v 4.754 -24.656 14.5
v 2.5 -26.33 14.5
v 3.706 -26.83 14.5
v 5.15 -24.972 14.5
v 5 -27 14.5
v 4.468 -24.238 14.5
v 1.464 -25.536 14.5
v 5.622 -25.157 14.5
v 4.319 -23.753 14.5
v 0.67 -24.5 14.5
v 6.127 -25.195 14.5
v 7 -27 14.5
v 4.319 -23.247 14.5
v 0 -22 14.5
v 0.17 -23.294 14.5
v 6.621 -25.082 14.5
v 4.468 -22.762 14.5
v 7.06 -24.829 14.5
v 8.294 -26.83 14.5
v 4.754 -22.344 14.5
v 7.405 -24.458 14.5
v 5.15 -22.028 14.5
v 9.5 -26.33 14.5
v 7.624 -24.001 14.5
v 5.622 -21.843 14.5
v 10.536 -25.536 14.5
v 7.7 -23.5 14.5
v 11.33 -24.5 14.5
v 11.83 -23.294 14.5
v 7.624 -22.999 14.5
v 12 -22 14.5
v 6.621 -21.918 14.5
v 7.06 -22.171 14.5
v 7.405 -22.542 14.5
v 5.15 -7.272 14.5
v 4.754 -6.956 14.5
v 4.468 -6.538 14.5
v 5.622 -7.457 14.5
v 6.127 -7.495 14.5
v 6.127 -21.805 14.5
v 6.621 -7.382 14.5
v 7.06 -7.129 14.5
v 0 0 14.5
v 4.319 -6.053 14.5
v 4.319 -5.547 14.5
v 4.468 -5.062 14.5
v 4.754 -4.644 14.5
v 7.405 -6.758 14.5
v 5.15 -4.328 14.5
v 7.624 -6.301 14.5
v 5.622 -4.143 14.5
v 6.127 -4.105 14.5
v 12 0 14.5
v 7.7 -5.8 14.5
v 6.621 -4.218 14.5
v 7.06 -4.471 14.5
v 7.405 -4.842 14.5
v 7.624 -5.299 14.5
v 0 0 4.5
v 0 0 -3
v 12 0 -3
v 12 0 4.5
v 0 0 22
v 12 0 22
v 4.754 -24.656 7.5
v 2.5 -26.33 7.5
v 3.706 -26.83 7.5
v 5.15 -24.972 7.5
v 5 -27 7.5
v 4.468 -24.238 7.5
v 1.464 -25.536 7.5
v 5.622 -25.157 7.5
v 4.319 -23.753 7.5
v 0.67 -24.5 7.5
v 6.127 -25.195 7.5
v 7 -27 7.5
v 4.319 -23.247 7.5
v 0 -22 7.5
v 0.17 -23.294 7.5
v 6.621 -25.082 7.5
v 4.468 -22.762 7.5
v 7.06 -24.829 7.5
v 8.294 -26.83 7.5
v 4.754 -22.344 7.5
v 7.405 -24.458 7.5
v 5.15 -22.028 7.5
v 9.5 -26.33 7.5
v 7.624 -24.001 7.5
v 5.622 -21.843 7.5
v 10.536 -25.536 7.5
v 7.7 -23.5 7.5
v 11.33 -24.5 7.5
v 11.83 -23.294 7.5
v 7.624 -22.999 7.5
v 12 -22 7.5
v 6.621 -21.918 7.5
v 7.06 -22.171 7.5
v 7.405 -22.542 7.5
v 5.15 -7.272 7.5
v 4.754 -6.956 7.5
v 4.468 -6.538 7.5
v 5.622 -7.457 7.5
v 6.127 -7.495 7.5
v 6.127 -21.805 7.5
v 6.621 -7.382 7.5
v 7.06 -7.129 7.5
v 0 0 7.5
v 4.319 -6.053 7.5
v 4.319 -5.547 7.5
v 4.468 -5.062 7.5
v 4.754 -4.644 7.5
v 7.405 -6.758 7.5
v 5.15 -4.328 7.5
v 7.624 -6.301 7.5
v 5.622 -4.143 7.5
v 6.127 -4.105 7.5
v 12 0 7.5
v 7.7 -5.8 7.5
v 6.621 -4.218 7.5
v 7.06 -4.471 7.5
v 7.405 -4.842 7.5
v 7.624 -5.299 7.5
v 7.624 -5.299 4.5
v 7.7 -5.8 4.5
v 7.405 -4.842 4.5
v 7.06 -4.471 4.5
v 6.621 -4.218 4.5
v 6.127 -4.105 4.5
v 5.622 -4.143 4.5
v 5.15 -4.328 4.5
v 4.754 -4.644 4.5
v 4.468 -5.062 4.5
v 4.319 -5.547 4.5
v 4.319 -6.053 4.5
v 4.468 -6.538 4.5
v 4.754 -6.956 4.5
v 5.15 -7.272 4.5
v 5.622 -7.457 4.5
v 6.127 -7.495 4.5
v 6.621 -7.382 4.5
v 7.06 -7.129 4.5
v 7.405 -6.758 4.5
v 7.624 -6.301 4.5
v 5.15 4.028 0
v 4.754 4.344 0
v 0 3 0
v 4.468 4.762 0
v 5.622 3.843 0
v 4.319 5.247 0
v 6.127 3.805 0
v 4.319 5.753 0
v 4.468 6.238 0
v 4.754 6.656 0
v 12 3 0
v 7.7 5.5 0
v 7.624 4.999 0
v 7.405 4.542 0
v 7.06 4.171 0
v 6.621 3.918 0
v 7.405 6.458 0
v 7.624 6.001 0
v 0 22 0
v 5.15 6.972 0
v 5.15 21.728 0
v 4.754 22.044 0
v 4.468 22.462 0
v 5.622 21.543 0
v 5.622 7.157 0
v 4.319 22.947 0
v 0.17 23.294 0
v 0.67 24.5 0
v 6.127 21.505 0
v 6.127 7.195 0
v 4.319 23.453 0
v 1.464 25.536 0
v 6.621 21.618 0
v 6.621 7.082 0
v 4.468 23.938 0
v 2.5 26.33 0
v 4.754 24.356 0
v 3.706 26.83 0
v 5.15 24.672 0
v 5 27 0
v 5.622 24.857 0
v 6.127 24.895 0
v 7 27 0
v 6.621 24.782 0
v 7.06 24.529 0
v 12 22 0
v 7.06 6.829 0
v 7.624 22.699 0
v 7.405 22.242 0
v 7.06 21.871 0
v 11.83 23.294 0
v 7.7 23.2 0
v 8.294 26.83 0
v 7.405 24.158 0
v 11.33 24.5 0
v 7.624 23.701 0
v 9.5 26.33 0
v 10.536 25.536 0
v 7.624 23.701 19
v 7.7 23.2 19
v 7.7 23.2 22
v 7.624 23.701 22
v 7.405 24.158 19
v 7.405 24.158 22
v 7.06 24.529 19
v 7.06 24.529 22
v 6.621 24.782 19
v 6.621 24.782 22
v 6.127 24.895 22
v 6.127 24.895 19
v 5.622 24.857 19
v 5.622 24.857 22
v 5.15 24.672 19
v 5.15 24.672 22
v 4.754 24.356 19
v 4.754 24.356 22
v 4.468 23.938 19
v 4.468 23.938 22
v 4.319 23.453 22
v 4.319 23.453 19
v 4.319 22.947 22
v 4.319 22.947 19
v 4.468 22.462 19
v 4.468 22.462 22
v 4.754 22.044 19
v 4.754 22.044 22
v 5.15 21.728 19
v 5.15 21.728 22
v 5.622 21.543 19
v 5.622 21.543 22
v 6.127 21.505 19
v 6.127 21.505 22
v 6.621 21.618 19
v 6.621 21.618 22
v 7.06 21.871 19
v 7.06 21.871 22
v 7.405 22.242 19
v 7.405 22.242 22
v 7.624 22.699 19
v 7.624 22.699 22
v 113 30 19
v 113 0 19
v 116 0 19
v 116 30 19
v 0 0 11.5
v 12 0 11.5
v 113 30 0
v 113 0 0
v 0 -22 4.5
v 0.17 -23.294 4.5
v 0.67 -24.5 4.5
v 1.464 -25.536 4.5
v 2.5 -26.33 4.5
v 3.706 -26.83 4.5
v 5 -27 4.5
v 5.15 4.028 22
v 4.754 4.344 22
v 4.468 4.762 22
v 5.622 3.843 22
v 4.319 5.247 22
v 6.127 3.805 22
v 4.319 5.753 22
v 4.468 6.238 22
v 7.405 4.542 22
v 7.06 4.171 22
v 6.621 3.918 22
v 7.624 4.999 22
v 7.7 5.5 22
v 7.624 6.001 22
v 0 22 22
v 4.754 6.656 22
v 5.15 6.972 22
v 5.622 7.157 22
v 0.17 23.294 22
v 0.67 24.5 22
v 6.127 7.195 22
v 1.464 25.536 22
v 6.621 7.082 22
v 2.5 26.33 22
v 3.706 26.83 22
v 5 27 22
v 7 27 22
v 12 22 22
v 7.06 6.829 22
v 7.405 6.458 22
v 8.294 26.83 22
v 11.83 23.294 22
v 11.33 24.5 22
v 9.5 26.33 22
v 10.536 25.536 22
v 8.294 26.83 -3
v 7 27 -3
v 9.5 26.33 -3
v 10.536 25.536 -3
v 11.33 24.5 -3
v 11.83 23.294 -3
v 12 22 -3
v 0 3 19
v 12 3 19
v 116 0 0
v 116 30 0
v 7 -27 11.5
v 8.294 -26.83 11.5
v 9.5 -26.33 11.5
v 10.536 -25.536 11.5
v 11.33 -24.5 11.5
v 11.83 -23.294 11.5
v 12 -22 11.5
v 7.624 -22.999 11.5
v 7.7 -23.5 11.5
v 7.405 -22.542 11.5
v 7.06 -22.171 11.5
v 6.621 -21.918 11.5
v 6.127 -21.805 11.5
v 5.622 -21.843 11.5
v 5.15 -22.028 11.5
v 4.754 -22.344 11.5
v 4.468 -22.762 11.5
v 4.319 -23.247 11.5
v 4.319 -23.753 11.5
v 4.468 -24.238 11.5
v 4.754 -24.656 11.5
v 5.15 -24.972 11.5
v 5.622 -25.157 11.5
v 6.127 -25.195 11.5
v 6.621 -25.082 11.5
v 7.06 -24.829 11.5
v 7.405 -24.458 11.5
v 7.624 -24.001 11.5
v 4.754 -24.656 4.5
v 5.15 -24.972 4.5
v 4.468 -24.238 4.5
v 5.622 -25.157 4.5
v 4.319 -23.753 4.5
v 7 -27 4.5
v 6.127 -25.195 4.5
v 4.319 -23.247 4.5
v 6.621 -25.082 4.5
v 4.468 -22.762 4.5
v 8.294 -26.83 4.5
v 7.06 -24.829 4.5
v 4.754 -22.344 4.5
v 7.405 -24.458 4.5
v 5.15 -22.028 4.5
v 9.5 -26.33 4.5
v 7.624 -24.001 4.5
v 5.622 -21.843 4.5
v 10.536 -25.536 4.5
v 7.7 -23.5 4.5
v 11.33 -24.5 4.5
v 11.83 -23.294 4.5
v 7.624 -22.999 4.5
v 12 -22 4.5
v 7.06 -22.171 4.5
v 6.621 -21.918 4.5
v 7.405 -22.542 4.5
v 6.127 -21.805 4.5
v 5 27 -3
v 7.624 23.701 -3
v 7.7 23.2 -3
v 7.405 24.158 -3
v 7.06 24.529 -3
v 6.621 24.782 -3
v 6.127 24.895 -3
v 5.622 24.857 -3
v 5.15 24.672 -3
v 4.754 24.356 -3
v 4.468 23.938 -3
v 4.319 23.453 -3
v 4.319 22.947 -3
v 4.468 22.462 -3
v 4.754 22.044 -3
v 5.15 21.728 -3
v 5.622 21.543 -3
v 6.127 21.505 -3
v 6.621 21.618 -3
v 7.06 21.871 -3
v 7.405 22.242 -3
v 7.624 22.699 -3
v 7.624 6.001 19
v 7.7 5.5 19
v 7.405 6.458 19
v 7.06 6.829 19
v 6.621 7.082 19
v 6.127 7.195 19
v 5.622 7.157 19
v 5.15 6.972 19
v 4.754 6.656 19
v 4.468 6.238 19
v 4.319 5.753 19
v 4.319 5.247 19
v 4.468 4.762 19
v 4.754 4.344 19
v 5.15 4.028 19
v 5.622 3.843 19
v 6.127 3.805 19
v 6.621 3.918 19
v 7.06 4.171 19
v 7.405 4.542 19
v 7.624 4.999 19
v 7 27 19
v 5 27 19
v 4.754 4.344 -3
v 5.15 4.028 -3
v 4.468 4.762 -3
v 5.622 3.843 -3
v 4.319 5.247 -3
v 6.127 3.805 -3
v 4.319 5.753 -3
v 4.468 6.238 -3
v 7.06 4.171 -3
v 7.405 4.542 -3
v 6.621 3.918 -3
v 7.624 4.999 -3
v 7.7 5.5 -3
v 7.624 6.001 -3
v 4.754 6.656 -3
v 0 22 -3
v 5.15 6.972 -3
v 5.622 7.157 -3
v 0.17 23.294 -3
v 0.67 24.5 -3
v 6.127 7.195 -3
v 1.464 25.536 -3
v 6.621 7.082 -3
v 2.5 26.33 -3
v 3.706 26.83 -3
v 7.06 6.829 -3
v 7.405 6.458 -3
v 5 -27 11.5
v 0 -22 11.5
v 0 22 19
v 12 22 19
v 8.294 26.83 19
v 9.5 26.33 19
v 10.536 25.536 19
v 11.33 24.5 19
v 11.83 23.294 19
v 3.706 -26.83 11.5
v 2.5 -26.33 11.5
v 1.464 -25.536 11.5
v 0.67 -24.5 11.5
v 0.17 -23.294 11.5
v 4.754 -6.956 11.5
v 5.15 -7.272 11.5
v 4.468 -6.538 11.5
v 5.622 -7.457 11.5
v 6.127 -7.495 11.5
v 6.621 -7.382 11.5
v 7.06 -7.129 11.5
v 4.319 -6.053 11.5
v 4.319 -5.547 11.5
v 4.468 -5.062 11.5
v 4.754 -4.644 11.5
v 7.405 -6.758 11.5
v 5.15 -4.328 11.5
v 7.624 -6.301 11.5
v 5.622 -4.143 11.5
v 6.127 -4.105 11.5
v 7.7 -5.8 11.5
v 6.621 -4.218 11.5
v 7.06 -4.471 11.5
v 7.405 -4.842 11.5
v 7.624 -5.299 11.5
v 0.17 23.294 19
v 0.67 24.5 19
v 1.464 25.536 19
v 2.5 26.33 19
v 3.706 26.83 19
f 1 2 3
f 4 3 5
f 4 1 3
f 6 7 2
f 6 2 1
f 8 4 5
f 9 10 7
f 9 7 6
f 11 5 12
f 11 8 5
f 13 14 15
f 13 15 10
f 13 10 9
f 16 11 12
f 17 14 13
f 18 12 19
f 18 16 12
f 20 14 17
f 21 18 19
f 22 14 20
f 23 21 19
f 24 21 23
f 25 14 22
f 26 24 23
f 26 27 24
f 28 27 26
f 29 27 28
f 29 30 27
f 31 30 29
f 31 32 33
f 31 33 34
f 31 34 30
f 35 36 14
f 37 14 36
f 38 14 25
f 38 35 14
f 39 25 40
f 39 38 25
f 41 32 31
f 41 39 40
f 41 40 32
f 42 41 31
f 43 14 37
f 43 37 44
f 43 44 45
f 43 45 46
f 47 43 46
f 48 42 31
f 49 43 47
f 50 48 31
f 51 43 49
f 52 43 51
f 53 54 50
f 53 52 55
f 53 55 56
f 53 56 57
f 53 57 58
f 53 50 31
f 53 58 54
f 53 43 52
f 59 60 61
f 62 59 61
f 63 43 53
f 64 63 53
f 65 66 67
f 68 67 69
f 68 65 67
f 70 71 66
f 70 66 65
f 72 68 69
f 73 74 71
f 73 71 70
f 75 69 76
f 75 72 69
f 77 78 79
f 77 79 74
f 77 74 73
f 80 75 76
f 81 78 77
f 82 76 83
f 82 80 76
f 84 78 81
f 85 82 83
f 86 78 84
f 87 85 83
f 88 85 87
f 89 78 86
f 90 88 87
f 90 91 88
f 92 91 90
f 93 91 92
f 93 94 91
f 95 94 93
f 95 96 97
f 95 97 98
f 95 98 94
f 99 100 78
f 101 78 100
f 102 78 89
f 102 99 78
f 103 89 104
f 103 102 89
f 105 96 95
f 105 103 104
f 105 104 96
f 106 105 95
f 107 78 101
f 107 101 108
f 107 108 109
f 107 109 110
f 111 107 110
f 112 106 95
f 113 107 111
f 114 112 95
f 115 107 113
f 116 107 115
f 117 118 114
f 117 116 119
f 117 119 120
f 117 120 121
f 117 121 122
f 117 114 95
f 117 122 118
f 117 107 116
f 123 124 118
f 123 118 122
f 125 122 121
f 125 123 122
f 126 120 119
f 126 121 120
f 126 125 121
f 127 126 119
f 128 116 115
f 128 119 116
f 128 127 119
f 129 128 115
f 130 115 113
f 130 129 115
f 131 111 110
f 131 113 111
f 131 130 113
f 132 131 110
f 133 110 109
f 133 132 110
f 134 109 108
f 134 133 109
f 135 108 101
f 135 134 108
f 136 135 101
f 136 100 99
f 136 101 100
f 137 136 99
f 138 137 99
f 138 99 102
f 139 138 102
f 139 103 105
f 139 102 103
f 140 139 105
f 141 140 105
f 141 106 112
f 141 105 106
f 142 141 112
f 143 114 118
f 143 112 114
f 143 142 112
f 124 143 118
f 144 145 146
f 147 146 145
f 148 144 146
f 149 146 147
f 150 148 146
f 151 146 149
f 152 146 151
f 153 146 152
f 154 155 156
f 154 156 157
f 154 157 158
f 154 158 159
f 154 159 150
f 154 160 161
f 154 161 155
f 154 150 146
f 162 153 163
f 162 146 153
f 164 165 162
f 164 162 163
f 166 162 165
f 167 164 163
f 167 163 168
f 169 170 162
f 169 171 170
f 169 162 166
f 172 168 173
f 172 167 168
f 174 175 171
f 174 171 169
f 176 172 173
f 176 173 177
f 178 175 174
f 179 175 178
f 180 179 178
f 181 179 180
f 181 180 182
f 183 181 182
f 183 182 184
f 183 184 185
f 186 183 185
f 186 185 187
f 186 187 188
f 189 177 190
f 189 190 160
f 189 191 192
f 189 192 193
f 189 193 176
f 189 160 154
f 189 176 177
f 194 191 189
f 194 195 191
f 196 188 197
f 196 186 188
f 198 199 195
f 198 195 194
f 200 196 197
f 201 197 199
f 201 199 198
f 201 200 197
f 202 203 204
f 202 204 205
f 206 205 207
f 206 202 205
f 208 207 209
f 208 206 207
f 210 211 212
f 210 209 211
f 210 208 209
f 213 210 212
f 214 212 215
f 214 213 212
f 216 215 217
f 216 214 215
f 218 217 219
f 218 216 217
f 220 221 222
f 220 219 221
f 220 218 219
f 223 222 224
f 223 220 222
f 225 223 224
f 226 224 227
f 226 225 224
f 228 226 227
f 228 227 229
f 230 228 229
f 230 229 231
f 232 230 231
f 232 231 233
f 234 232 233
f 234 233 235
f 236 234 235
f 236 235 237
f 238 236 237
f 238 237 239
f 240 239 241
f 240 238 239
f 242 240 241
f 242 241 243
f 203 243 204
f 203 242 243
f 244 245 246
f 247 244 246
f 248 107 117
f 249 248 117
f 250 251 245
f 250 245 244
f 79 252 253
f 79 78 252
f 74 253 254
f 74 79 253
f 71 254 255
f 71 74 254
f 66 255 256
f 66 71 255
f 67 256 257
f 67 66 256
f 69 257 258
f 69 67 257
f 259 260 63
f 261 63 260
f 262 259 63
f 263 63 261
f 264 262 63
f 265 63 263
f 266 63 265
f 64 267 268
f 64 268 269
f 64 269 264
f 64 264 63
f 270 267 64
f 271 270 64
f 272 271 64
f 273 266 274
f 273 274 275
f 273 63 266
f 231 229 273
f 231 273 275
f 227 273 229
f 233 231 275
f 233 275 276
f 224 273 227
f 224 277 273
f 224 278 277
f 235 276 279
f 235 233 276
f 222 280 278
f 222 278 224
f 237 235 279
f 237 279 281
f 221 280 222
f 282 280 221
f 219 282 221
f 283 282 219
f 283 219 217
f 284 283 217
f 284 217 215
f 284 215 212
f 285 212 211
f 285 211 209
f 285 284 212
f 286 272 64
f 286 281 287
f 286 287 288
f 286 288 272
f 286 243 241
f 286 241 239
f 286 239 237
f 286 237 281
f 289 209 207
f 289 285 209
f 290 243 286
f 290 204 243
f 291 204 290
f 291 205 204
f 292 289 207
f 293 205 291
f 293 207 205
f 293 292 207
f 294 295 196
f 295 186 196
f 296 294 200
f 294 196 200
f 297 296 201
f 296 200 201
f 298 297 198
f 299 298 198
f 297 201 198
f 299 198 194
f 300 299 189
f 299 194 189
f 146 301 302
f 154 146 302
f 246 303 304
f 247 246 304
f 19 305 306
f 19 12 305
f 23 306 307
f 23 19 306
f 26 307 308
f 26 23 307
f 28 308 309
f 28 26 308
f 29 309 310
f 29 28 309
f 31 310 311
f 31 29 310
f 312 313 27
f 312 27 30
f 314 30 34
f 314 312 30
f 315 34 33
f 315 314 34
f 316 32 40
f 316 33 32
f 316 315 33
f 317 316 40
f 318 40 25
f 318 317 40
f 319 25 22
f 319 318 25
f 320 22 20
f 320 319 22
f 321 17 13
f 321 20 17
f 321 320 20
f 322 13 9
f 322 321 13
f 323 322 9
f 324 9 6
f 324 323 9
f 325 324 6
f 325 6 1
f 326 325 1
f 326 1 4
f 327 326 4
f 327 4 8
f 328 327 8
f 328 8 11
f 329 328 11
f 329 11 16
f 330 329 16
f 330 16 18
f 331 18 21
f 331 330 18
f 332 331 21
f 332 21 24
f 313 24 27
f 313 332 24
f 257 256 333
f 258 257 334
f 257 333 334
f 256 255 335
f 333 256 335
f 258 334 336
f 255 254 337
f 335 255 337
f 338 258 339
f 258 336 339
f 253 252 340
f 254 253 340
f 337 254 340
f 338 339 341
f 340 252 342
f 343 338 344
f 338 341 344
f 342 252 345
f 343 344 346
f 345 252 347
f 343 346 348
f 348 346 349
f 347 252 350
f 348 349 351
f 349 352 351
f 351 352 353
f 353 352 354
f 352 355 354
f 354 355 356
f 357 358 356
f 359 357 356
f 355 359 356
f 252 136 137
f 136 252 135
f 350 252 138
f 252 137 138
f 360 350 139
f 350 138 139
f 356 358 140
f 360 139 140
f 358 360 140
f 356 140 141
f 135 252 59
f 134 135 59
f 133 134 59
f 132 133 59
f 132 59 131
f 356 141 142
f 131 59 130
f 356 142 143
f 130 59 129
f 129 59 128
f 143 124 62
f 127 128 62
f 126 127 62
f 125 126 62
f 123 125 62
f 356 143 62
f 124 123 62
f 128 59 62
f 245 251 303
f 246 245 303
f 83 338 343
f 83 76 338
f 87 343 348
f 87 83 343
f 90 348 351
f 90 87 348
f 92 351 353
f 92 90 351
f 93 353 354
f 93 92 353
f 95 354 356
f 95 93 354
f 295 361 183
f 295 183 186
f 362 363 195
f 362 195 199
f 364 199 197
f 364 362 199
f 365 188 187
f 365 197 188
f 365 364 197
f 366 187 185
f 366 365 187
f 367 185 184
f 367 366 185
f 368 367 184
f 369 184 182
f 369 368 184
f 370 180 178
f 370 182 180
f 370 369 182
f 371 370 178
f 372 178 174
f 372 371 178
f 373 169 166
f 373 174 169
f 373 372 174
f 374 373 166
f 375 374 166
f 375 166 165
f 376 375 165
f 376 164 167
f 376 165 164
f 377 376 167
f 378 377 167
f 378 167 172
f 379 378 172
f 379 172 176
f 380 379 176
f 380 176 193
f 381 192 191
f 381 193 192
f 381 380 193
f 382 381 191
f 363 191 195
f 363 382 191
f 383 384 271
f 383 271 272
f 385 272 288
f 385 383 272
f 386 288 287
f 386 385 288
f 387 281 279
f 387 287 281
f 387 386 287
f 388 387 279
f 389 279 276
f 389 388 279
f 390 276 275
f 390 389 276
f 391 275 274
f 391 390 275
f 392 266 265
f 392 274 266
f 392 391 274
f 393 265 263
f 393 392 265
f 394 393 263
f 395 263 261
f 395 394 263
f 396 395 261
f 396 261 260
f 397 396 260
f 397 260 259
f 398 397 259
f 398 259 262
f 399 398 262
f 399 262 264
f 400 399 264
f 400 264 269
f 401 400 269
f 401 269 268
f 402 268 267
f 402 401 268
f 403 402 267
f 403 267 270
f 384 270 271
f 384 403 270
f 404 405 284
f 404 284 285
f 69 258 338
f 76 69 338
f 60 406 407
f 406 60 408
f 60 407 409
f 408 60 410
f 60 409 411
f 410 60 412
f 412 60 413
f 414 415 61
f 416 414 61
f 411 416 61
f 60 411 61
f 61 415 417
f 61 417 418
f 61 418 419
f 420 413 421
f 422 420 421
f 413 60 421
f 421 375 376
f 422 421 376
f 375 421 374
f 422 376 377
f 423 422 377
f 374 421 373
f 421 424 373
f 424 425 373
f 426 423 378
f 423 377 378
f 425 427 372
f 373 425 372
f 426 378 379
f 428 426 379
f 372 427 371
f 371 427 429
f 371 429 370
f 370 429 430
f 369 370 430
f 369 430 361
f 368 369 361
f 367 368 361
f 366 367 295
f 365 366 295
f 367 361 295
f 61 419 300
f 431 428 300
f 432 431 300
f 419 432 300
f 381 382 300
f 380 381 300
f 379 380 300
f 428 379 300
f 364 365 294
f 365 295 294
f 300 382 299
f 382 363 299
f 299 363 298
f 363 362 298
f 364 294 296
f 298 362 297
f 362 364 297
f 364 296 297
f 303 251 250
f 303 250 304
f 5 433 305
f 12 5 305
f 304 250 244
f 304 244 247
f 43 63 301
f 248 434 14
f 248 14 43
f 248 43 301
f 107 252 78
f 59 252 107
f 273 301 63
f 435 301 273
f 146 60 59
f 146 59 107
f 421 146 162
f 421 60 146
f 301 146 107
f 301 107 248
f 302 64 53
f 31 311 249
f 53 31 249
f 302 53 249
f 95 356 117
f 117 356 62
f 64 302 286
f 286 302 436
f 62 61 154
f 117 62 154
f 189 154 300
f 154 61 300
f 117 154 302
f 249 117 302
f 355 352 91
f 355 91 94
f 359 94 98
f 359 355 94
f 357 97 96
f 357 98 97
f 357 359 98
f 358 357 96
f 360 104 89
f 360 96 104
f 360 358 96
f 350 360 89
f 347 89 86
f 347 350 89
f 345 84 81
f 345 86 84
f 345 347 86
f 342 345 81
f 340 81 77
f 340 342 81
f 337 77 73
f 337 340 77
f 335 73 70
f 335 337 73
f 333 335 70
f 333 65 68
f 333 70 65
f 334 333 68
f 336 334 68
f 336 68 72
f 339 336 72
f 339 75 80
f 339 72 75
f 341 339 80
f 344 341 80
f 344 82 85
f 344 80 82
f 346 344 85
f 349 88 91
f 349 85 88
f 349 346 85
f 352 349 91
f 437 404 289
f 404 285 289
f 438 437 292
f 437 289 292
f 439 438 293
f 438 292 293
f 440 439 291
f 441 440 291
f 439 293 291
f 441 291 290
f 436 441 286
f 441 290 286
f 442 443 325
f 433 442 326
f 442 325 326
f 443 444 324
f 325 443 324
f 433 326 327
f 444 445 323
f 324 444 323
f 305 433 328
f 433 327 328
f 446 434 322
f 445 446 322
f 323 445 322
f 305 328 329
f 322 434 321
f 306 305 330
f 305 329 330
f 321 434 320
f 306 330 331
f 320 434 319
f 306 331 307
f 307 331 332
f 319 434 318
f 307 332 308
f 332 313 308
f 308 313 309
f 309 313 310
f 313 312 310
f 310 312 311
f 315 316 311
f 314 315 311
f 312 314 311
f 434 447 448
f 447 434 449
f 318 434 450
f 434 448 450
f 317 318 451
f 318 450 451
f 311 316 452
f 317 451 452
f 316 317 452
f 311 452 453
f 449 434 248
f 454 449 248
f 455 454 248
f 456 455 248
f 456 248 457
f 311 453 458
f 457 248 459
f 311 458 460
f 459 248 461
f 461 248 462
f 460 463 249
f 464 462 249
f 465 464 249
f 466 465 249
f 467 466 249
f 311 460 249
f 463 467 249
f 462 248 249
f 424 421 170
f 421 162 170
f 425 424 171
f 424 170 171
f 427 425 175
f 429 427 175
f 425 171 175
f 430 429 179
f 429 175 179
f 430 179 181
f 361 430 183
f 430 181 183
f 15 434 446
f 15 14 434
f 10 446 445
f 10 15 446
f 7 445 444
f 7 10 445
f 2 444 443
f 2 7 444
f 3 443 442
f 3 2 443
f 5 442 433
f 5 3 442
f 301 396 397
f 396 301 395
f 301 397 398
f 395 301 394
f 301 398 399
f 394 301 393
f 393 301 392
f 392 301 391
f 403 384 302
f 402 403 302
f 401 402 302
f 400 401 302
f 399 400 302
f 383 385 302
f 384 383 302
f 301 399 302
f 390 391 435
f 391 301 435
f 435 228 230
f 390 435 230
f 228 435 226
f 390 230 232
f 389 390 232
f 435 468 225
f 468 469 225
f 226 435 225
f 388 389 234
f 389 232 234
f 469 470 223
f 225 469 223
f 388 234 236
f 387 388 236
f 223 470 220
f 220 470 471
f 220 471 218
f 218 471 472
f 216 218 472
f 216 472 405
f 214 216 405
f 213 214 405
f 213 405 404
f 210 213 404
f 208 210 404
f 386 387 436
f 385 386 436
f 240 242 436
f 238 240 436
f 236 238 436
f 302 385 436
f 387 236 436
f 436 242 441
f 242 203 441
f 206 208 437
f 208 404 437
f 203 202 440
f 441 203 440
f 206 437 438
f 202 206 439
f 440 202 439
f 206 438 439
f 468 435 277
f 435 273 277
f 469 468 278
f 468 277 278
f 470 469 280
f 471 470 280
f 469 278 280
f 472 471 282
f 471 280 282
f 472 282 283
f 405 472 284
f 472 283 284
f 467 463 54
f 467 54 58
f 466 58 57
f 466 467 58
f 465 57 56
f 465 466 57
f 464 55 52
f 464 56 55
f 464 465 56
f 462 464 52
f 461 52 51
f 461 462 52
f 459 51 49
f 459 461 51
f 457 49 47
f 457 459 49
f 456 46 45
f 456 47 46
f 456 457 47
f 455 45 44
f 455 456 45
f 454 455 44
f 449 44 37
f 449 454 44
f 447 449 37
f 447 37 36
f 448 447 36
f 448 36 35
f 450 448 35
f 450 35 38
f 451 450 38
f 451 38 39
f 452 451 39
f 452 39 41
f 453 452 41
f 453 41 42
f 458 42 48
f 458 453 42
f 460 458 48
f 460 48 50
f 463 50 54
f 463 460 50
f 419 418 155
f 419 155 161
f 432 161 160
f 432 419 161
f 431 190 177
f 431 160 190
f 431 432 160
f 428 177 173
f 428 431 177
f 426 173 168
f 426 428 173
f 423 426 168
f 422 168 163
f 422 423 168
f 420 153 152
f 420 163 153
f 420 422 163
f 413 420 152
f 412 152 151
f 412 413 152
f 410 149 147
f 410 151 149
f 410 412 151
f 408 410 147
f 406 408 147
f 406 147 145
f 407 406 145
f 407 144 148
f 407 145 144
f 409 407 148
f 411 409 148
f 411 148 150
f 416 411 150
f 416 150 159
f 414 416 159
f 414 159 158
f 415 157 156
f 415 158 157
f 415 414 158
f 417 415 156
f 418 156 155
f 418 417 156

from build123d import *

# Parameters (mm, degrees)
BOX003_W          = 3
BOX003_H          = 30
BOX003_DEPTH      = 19
CYLINDER001_R     = 1.7
CYLINDER001_DEPTH = 31
CYLINDER_R        = 1.7
CYLINDER_DEPTH    = 31
BOX001_W          = 12
BOX001_H          = 27
BOX001_DEPTH      = 3
BOX002_W          = 12
BOX002_H          = 27
BOX002_DEPTH      = 3
BOX004_W          = 12
BOX004_H          = 27
BOX004_DEPTH      = 3
BOX005_W          = 12
BOX005_H          = 27
BOX005_DEPTH      = 3
BOX_W             = 12
BOX_H             = 3
BOX_DEPTH         = 19
FILLET_R          = 5


with BuildPart() as cube003:
    # Box003 → Box003 (new body)
    with BuildSketch(Plane(origin=(113, 0, 0), x_dir=(1, 0, 0), z_dir=(0, 0, 1))):
        with Locations((1.5, 15)):
            Rectangle(BOX003_W, BOX003_H)
    extrude(amount=BOX003_DEPTH)


with BuildPart() as cylinder001:
    # Cylinder001 → Cylinder001 (new body)
    with BuildSketch(Plane(origin=(6, 23.2, -6), x_dir=(1, 0, 0), z_dir=(0, 0, 1))):
        Circle(CYLINDER001_R)
    extrude(amount=CYLINDER001_DEPTH)


with BuildPart() as cylinder:
    # Cylinder → Cylinder (new body)
    with BuildSketch(Plane(origin=(6, 5.5, -6), x_dir=(1, 0, 0), z_dir=(0, 0, 1))):
        Circle(CYLINDER_R)
    extrude(amount=CYLINDER_DEPTH)


with BuildPart() as orificios001:
    # Fusion base: copy of Cylinder
    add(cylinder.part)

    # Fusion: union Cylinder001
    add(cylinder001.part)


with BuildPart() as orificios001_1:
    # Fusion placement: moved
    add(orificios001.part.moved(Location((0, -29, 0))))


with BuildPart() as orificios_todos:
    # Fusion001 base: copy of Cylinder
    add(cylinder.part)

    # Fusion001: union Cylinder001
    add(cylinder001.part)

    # Fusion002: union orificios001
    add(orificios001_1.part)


with BuildPart() as cube001:
    # Box001 → Box001 (new body)
    with BuildSketch(Plane.XY.offset(-3)):
        with Locations((6, 13.5)):
            Rectangle(BOX001_W, BOX001_H)
    extrude(amount=BOX001_DEPTH)


with BuildPart() as cube002:
    # Box002 → Box002 (new body)
    with BuildSketch(Plane.XY.offset(19)):
        with Locations((6, 13.5)):
            Rectangle(BOX002_W, BOX002_H)
    extrude(amount=BOX002_DEPTH)


with BuildPart() as cube004:
    # Box004 → Box004 (new body)
    with BuildSketch(Plane(origin=(0, -27, 4.5), x_dir=(1, 0, 0), z_dir=(0, 0, 1))):
        with Locations((6, 13.5)):
            Rectangle(BOX004_W, BOX004_H)
    extrude(amount=BOX004_DEPTH)


with BuildPart() as cube005:
    # Box005 → Box005 (new body)
    with BuildSketch(Plane(origin=(0, -27, 11.5), x_dir=(1, 0, 0), z_dir=(0, 0, 1))):
        with Locations((6, 13.5)):
            Rectangle(BOX005_W, BOX005_H)
    extrude(amount=BOX005_DEPTH)


with BuildPart() as fillet_body:
    # Box → Box (new body)
    with BuildSketch(Plane.XY):
        with Locations((6, 1.5)):
            Rectangle(BOX_W, BOX_H)
    extrude(amount=BOX_DEPTH)

    # Fusion003: union Cube001, Cube002, Cube004, Cube005
    add(cube001.part)
    add(cube002.part)
    add(cube004.part)
    add(cube005.part)

    # Cut: cut orificios todos
    add(orificios_todos.part, mode=Mode.SUBTRACT)

    # Fillet
    fillet_edges = [fillet_body.edges().sort_by_distance(p)[0] for p in [
        (12, -27, 13),
        (0, -27, 13),
        (12, -27, 6),
        (12, 27, -1.5),
        (12, 27, 20.5),
        (0, 27, 20.5),
        (0, 27, -1.5),
        (0, -27, 6),
    ]]
    fillet(fillet_edges, radius=FILLET_R)


solid = Compound([cube003.part, fillet_body.part])
